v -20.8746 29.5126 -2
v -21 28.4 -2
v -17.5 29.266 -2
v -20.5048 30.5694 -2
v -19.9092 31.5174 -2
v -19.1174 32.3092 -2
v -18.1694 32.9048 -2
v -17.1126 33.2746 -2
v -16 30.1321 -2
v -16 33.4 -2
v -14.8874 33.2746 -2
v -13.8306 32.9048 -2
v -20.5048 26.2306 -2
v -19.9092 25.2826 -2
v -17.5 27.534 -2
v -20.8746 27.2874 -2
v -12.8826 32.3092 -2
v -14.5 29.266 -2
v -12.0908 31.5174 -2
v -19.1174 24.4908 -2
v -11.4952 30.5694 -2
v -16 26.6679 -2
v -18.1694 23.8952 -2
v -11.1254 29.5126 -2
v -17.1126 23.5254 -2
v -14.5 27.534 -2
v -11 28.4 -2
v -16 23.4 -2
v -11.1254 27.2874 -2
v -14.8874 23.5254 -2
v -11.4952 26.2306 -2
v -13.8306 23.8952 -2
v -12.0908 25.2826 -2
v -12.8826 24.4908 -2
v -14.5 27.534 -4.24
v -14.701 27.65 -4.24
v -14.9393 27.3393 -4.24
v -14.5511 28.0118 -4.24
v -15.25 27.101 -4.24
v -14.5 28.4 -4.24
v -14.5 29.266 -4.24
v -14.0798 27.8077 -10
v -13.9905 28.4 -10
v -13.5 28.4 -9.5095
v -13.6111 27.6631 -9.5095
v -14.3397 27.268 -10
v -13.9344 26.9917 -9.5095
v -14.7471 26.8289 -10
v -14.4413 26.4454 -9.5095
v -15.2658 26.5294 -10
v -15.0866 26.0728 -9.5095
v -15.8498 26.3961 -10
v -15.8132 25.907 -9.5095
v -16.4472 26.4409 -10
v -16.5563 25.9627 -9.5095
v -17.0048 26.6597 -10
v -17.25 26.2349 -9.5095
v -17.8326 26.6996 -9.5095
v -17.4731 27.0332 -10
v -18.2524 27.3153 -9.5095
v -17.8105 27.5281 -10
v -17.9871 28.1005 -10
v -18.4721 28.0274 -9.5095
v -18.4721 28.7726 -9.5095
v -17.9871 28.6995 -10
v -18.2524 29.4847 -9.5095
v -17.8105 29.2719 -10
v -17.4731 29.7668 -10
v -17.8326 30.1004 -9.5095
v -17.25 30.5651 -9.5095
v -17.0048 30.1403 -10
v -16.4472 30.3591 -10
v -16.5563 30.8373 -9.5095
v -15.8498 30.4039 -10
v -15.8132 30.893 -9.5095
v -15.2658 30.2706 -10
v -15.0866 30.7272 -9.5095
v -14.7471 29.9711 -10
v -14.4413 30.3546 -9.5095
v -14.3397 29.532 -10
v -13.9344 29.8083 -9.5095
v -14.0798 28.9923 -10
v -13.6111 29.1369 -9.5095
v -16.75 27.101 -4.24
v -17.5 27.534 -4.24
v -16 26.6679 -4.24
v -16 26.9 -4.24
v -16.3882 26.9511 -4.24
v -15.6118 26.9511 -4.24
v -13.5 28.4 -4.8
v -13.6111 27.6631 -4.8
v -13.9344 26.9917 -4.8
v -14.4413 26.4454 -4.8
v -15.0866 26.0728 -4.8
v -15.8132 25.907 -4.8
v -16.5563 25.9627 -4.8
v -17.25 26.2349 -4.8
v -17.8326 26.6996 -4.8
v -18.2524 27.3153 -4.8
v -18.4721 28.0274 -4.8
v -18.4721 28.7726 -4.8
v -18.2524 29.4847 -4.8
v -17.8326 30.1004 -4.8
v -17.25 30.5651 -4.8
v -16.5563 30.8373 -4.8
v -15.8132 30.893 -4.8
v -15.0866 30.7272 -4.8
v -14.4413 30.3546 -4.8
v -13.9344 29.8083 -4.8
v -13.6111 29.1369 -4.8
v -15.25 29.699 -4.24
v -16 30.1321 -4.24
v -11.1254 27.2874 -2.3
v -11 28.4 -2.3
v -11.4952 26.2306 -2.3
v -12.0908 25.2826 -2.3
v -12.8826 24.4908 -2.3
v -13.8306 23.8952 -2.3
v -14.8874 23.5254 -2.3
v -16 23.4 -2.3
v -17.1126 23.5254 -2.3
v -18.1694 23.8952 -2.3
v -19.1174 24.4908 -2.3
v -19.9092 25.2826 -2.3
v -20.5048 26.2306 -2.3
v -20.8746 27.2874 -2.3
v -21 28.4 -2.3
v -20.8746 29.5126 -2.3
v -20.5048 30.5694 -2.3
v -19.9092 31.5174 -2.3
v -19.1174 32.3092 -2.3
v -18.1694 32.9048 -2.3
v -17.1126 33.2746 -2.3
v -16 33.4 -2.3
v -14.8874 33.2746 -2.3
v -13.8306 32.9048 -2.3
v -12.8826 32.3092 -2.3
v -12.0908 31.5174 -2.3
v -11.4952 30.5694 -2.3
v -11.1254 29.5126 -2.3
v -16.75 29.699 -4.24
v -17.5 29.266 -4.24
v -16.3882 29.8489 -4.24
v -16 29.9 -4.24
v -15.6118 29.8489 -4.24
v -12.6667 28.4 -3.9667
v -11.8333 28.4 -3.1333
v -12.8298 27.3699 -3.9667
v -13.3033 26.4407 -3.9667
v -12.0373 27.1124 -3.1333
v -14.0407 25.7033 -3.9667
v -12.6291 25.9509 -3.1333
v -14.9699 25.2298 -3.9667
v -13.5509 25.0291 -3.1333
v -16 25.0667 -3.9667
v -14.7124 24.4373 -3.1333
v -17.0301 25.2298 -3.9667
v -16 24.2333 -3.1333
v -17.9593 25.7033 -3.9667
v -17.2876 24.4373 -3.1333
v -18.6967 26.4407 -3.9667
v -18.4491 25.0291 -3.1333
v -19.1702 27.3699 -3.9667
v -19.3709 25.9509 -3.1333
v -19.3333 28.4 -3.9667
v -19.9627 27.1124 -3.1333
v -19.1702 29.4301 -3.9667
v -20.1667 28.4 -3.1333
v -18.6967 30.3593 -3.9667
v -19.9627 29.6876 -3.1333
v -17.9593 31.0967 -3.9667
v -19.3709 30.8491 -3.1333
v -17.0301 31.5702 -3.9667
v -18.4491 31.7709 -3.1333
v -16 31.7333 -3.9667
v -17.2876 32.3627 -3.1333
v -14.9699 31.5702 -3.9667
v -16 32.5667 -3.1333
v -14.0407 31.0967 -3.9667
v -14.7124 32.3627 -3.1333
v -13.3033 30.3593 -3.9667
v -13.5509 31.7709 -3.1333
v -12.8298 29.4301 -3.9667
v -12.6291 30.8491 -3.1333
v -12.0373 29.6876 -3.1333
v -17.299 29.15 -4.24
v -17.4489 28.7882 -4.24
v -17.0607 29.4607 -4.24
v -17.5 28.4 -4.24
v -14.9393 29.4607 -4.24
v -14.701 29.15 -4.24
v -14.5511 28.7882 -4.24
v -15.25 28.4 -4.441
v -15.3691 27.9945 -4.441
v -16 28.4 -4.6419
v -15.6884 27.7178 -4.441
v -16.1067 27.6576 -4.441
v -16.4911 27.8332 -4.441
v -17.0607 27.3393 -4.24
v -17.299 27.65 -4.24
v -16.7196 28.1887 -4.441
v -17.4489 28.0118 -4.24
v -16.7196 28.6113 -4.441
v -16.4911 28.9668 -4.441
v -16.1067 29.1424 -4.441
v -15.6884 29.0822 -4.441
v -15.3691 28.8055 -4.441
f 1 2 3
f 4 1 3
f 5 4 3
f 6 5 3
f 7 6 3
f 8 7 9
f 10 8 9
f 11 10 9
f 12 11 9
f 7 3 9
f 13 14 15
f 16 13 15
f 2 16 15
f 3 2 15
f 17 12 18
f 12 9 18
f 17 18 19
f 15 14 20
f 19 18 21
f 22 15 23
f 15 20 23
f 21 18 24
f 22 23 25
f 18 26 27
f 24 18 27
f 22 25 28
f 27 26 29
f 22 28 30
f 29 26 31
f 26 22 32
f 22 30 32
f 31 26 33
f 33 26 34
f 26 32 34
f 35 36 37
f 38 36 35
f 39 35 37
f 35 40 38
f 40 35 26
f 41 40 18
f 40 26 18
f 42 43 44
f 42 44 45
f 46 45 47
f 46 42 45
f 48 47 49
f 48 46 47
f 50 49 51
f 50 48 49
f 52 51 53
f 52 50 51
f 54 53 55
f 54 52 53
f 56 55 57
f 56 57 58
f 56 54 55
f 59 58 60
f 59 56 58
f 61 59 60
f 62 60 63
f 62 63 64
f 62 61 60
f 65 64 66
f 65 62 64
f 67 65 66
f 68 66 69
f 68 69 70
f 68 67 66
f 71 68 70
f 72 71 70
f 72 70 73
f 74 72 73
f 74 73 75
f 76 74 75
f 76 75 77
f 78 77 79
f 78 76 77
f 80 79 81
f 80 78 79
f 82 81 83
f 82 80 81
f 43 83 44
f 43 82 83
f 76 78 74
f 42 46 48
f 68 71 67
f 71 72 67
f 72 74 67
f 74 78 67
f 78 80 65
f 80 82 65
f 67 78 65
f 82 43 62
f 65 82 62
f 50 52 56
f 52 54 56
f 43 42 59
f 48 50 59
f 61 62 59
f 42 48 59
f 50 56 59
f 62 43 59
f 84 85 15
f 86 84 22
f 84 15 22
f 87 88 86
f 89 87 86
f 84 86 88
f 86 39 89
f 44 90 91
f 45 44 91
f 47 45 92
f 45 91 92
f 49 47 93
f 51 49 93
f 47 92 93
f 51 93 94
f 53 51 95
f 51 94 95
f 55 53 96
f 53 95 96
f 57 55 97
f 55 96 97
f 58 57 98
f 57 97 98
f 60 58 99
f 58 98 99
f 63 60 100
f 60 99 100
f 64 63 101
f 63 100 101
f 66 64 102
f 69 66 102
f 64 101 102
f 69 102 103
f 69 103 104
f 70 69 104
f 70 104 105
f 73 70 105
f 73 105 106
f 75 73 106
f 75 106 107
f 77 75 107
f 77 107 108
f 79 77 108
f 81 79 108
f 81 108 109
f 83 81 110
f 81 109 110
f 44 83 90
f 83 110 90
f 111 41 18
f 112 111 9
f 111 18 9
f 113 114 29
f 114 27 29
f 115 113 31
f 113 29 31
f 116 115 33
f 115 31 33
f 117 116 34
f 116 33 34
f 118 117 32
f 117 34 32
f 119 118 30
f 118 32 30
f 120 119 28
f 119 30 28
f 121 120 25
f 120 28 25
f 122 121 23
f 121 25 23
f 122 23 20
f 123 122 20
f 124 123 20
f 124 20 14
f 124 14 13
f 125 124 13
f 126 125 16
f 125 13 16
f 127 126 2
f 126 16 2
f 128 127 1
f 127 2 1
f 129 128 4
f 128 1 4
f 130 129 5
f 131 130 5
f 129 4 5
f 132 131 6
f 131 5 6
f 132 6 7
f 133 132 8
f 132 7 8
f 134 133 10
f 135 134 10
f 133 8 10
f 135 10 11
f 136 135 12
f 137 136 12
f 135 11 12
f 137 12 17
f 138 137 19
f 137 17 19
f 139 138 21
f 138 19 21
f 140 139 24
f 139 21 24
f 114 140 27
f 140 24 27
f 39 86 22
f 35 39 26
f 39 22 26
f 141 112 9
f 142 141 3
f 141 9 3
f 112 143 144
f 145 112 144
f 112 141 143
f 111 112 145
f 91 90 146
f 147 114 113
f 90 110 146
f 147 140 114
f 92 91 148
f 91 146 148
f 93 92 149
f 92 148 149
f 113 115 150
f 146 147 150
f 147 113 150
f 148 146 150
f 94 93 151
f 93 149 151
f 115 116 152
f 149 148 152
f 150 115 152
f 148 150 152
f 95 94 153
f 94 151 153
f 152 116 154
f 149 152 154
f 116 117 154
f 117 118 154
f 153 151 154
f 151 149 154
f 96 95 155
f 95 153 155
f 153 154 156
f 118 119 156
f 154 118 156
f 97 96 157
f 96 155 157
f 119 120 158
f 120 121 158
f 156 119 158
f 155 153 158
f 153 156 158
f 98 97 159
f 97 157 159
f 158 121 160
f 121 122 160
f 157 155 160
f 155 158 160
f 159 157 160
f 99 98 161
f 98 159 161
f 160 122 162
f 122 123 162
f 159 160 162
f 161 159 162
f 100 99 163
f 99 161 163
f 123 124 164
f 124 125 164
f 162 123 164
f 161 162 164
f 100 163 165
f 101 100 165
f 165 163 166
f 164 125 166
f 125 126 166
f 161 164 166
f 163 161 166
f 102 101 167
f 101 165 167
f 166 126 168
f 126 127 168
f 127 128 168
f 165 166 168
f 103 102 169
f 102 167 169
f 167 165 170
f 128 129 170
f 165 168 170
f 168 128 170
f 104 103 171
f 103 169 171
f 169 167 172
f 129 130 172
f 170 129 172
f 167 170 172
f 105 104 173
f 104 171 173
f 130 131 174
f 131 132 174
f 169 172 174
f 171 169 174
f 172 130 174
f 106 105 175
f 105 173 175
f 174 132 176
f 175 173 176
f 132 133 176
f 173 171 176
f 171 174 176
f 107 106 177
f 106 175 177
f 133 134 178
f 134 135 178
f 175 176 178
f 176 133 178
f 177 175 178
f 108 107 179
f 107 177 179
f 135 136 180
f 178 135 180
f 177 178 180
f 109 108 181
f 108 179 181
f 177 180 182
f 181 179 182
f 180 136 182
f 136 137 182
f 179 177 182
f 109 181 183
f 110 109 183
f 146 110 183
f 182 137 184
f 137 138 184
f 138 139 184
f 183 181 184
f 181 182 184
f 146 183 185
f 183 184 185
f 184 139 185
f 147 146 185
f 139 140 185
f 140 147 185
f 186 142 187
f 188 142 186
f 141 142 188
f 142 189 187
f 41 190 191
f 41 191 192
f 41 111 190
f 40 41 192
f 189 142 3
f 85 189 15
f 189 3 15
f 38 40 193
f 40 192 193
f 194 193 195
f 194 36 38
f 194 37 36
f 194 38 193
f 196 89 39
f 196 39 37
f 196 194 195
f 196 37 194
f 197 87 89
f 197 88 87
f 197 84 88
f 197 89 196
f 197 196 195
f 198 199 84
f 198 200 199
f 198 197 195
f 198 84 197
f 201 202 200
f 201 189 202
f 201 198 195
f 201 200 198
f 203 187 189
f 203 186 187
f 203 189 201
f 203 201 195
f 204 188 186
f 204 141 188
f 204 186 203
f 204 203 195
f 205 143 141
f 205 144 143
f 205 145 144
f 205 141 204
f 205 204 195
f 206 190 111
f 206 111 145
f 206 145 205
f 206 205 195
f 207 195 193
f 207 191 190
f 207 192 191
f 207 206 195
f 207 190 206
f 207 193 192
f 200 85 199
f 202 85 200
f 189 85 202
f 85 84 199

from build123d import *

# Parameters (mm, degrees)
EXTRUDE1_DEPTH = 2.24
CHAMFER1_SIZE  = 0.4905


with BuildPart() as part:
    # Sketch1 → Revolve1 (revolve)
    with BuildSketch(Plane.XZ.offset(-28.4)):
        Polygon((-11, -2), (-16, -2), (-16, -10), (-13.5, -10), (-13.5, -4.8), (-11, -2.3), align=None)
    revolve(axis=Axis((-16, 28.4, -2), (0, 0, -1)))

    # Sketch2 → Extrude1 (cut)
    with BuildSketch(Plane.XY.offset(-2)):
        Polygon((-17.5, 29.266025404), (-17.5, 27.533974596), (-16, 26.667949192), (-14.5, 27.533974596), (-14.5, 29.266025404), (-16, 30.132050808), align=None)
    extrude(amount=-EXTRUDE1_DEPTH, mode=Mode.SUBTRACT)

    # Sketch3 → Cut-Revolve1 (revolve, cut)
    with BuildSketch(Plane.XZ.offset(-28.4)):
        Polygon((-14.5, -4.24), (-16, -4.24), (-16, -4.641923789), align=None)
    revolve(axis=Axis((-16, 28.4, -4.239975), (0, 0, -1)), mode=Mode.SUBTRACT)

    # Chamfer1
    chamfer1_edges = [part.edges().sort_by_distance(p)[0] for p in [
        (-18.5, 28.4, -10),
    ]]
    chamfer(chamfer1_edges, length=CHAMFER1_SIZE)


solid = part.part
